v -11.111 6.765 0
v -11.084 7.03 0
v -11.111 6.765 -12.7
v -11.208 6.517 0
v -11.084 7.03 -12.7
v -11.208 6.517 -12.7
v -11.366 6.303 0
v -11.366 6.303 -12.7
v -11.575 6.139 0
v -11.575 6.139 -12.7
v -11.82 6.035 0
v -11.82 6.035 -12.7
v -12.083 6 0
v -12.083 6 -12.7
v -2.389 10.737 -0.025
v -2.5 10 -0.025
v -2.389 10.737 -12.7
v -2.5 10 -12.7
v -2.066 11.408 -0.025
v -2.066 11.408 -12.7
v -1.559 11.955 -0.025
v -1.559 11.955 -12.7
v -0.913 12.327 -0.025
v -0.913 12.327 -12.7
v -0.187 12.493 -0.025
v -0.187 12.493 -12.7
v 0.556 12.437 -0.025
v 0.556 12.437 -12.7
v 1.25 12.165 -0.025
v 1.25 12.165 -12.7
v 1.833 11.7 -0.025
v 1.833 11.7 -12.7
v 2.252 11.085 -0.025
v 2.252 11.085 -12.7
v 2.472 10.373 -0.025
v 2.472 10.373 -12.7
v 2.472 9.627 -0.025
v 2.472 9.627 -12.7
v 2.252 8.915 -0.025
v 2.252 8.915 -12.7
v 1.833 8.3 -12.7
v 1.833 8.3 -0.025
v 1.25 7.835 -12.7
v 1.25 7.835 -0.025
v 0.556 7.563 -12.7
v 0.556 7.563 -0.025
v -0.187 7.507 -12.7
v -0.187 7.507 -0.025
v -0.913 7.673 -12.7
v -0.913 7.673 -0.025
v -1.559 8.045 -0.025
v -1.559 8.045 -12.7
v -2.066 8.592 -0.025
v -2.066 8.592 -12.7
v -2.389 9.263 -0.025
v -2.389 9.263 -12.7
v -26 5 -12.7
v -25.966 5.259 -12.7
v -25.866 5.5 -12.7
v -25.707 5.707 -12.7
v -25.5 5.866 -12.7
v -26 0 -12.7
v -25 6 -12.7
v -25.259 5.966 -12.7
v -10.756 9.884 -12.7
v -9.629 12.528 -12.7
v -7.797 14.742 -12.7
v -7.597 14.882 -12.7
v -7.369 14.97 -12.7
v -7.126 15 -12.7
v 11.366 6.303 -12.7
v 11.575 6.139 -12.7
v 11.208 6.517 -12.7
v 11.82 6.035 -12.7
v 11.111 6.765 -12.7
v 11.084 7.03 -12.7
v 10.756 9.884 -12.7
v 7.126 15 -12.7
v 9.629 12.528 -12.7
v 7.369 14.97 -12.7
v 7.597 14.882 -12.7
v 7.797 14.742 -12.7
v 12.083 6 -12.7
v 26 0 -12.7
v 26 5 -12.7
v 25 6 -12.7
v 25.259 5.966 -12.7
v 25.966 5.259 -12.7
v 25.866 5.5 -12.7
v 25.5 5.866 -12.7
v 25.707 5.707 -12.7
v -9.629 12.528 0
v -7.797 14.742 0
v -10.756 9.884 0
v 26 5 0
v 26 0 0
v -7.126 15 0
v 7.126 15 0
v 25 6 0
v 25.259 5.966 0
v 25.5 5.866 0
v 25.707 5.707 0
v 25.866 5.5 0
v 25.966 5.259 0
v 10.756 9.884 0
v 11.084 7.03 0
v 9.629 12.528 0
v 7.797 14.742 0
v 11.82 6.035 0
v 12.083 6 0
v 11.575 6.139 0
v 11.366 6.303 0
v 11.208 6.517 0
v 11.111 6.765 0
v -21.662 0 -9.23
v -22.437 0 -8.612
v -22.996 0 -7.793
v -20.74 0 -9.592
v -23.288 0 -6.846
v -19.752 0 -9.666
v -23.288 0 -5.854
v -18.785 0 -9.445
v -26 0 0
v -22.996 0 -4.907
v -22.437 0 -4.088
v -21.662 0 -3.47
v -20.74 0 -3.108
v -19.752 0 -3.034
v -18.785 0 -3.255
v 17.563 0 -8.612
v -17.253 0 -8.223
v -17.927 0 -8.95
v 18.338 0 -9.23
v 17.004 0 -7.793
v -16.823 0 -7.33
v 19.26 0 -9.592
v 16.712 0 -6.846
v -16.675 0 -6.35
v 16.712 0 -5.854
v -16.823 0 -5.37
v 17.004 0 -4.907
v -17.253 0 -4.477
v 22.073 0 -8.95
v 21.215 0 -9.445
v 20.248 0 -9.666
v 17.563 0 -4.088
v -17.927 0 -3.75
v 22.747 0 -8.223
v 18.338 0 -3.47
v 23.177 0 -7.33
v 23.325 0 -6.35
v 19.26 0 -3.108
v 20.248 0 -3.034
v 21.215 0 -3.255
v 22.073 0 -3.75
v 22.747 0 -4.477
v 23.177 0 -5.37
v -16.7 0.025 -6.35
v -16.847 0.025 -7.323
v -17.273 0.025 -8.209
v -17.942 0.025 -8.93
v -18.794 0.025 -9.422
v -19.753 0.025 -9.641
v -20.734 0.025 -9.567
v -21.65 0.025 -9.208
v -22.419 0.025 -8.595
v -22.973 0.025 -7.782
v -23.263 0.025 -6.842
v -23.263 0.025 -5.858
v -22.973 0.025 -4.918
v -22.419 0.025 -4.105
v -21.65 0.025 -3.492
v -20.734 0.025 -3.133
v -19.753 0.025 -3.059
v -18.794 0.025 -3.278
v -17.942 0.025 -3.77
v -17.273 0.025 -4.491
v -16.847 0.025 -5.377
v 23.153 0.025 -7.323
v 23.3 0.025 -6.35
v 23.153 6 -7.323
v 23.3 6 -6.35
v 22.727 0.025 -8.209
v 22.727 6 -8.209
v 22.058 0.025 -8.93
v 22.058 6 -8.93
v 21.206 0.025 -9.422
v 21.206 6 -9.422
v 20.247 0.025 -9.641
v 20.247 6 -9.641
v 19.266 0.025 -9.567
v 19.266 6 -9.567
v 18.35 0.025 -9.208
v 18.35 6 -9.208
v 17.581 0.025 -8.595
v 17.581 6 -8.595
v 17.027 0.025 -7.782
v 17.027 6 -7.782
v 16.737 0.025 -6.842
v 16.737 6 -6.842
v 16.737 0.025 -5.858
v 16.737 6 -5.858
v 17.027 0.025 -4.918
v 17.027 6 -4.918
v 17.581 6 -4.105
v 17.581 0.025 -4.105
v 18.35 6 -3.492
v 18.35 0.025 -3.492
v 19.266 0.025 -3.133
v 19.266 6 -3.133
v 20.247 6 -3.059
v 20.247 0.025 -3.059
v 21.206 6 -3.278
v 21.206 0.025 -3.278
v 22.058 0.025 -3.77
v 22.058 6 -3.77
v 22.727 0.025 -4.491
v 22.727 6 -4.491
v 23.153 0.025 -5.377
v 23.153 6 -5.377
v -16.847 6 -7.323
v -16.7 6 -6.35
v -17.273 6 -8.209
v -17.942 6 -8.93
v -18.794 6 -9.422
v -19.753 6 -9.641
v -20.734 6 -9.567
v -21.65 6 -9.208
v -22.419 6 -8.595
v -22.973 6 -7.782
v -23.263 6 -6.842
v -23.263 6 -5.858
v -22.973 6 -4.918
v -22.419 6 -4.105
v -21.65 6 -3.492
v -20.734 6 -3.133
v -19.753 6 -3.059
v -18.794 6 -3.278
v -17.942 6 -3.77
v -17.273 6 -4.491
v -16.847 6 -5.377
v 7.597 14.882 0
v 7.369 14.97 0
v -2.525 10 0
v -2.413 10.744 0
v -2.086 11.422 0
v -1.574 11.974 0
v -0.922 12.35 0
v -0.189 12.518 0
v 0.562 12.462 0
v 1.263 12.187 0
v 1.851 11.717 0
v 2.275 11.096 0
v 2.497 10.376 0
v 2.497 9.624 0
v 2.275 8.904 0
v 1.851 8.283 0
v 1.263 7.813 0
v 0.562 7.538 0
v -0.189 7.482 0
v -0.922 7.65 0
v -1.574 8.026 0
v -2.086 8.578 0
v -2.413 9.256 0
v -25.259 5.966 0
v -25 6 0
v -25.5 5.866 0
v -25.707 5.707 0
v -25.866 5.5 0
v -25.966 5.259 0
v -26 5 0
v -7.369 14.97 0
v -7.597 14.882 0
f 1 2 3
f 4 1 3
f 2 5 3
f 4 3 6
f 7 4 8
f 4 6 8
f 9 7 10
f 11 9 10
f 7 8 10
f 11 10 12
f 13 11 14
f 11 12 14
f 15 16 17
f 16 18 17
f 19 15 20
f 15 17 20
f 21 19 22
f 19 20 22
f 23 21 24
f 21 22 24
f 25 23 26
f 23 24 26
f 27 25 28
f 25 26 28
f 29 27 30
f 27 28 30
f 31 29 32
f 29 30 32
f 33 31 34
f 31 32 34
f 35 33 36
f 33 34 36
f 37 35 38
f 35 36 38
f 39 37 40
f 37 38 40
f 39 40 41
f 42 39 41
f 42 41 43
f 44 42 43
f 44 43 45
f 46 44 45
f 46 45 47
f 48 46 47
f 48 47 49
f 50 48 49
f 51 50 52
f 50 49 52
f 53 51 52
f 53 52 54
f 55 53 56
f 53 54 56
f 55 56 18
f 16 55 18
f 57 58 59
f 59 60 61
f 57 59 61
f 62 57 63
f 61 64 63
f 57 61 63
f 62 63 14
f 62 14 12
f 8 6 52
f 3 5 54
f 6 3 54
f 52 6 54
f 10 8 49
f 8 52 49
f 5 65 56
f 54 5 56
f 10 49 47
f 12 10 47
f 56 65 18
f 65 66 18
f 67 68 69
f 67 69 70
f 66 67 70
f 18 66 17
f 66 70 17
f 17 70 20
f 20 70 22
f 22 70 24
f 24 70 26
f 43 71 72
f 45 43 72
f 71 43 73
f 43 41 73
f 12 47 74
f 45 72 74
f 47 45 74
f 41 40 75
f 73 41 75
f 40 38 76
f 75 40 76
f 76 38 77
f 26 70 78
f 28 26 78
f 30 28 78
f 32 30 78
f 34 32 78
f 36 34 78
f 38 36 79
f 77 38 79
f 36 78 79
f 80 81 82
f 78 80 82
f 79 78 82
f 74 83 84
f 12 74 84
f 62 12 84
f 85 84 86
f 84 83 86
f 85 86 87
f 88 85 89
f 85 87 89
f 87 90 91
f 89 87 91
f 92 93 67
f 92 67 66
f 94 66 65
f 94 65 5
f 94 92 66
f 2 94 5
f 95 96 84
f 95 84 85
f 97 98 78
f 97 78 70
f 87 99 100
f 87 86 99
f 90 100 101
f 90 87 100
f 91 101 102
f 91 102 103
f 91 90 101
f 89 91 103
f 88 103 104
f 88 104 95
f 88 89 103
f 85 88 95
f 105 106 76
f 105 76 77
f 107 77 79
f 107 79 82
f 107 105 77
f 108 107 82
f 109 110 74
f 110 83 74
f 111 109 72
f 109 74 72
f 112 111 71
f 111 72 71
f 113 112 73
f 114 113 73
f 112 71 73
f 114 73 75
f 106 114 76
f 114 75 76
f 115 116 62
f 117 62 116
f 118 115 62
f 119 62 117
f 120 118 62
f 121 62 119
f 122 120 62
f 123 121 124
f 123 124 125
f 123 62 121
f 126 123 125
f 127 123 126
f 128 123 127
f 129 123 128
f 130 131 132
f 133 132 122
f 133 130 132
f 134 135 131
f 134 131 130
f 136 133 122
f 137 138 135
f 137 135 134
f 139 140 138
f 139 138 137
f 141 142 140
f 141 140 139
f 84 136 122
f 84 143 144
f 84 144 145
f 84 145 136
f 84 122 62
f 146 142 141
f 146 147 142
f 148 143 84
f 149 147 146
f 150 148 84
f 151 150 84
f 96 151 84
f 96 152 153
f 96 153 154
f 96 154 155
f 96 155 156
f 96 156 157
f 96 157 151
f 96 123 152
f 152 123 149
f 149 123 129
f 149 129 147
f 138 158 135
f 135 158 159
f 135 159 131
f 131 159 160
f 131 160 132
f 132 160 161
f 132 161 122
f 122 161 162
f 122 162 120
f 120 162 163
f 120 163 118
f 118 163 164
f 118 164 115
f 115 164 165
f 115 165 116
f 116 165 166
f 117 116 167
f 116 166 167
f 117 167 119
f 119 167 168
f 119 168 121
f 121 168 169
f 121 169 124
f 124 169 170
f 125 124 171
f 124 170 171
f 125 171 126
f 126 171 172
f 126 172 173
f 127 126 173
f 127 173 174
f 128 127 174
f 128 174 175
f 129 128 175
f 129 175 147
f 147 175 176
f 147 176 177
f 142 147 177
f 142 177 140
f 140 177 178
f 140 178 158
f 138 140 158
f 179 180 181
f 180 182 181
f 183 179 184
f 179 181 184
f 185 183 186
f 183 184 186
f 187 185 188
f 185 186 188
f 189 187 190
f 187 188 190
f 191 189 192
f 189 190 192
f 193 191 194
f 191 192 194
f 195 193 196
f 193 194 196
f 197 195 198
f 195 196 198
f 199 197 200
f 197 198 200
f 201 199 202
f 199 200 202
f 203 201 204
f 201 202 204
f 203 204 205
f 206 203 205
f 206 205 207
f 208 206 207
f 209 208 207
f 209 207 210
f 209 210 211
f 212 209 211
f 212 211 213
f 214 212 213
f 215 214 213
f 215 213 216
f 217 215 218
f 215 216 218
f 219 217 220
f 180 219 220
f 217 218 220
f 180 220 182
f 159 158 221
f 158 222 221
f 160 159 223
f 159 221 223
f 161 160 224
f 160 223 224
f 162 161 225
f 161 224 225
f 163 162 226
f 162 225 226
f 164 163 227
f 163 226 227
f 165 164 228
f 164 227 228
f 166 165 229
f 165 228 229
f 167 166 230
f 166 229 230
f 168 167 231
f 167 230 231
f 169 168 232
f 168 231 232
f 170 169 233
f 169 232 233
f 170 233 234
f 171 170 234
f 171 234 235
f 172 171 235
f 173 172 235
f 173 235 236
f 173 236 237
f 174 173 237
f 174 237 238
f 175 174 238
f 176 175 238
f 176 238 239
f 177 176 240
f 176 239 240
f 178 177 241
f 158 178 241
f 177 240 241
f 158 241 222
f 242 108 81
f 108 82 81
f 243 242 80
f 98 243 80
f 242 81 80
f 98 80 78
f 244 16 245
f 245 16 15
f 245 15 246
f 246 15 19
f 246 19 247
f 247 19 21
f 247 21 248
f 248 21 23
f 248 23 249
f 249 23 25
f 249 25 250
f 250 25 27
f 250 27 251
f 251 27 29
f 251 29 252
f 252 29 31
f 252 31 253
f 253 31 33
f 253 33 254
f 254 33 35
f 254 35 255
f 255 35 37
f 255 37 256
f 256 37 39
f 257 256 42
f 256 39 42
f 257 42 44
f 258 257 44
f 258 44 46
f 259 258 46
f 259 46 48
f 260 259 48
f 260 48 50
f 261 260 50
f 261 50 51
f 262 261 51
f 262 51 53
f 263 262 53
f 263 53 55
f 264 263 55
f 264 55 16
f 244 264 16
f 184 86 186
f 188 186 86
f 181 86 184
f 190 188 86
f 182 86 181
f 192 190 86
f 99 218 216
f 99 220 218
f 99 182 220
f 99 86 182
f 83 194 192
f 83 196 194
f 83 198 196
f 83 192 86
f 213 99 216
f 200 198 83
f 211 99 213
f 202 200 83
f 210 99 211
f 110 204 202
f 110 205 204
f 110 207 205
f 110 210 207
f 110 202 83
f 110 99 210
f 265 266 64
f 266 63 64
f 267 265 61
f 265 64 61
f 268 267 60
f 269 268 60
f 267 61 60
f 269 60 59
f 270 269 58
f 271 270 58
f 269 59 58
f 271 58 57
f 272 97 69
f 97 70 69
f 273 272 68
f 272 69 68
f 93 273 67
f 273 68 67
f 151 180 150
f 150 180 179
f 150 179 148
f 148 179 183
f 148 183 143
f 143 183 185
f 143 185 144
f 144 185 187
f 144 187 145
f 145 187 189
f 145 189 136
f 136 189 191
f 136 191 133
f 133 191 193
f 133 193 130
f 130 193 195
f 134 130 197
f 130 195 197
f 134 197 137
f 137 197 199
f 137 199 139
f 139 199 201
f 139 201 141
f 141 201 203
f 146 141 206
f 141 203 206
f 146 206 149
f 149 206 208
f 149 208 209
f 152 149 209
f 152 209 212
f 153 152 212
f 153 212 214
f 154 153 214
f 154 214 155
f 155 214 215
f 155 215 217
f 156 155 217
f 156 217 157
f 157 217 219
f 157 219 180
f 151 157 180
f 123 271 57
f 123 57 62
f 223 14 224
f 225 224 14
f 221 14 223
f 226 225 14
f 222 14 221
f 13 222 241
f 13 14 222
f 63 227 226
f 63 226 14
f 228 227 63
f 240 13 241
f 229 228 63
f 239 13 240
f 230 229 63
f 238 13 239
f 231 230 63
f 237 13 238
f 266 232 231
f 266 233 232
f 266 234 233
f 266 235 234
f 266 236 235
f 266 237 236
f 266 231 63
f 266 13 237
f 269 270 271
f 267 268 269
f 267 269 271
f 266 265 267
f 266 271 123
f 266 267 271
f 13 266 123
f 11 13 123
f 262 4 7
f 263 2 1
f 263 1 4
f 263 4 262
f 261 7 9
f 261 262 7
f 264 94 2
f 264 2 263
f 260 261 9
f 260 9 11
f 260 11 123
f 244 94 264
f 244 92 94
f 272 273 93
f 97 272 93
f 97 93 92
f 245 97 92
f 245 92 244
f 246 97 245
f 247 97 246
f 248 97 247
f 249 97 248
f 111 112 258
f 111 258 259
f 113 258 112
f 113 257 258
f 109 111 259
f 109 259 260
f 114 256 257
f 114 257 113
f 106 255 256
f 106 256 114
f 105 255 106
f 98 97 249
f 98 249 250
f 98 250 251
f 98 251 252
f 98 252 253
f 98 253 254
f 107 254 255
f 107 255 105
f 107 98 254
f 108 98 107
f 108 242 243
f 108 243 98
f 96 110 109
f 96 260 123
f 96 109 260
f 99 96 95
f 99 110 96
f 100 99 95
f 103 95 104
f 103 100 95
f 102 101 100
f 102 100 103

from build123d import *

# Parameters (mm, degrees)
BOSS_EXTRUDE1_DEPTH                   = 12.7
TAP_DRILL_FOR_M6X1_0_TAP1_D           = 5
TAP_DRILL_FOR_M6X1_0_TAP1_CSINK_D     = 5.05
TAP_DRILL_FOR_M6X1_0_TAP1_CSINK_ANGLE = 90
M6_CLEARANCE_HOLE1_D                  = 6.6
M6_CLEARANCE_HOLE1_CSINK_D            = 6.65
M6_CLEARANCE_HOLE1_CSINK_ANGLE        = 90
FILLET1_R                             = 1


with BuildPart() as part:
    # Sketch1 → Boss-Extrude1 (new body)
    with BuildSketch(Plane.XY):
        with BuildLine():
            Line((-26, 0), (26, 0))
            Line((26, 0), (26, 6))
            Line((26, 6), (11, 6))
            ThreePointArc((11, 6), (10.408351378, 10.95046998), (7.5, 15))
            Line((7.5, 15), (-7.5, 15))
            ThreePointArc((-7.5, 15), (-10.408351378, 10.95046998), (-11, 6))
            Line((-11, 6), (-26, 6))
            Line((-26, 6), (-26, 0))
        make_face()
    extrude(amount=-BOSS_EXTRUDE1_DEPTH)

    # Tap Drill for M6x1.0 Tap1 (through all)
    with Locations(Plane(origin=(0, 10, 0), x_dir=(1, 0, 0), z_dir=(0, 0, 1))):
        with Locations((0, 0)):
            CounterSinkHole(TAP_DRILL_FOR_M6X1_0_TAP1_D / 2, TAP_DRILL_FOR_M6X1_0_TAP1_CSINK_D / 2, counter_sink_angle=TAP_DRILL_FOR_M6X1_0_TAP1_CSINK_ANGLE)

    # M6 Clearance Hole1 (through all)
    with Locations(Plane(origin=(-20, 0, -6.35), x_dir=(-1, 0, 0), z_dir=(0, -1, 0))):
        with Locations((0, 0), (-40, 0)):
            CounterSinkHole(M6_CLEARANCE_HOLE1_D / 2, M6_CLEARANCE_HOLE1_CSINK_D / 2, counter_sink_angle=M6_CLEARANCE_HOLE1_CSINK_ANGLE)

    # Fillet1
    fillet1_edges = [part.edges().sort_by_distance(p)[0] for p in [
        (-26, 6, -6.35),
        (26, 6, -6.35),
        (11, 6, -6.35),
        (7.5, 15, -6.35),
        (-7.5, 15, -6.35),
        (-11, 6, -6.35),
    ]]
    fillet(fillet1_edges, radius=FILLET1_R)


solid = part.part
